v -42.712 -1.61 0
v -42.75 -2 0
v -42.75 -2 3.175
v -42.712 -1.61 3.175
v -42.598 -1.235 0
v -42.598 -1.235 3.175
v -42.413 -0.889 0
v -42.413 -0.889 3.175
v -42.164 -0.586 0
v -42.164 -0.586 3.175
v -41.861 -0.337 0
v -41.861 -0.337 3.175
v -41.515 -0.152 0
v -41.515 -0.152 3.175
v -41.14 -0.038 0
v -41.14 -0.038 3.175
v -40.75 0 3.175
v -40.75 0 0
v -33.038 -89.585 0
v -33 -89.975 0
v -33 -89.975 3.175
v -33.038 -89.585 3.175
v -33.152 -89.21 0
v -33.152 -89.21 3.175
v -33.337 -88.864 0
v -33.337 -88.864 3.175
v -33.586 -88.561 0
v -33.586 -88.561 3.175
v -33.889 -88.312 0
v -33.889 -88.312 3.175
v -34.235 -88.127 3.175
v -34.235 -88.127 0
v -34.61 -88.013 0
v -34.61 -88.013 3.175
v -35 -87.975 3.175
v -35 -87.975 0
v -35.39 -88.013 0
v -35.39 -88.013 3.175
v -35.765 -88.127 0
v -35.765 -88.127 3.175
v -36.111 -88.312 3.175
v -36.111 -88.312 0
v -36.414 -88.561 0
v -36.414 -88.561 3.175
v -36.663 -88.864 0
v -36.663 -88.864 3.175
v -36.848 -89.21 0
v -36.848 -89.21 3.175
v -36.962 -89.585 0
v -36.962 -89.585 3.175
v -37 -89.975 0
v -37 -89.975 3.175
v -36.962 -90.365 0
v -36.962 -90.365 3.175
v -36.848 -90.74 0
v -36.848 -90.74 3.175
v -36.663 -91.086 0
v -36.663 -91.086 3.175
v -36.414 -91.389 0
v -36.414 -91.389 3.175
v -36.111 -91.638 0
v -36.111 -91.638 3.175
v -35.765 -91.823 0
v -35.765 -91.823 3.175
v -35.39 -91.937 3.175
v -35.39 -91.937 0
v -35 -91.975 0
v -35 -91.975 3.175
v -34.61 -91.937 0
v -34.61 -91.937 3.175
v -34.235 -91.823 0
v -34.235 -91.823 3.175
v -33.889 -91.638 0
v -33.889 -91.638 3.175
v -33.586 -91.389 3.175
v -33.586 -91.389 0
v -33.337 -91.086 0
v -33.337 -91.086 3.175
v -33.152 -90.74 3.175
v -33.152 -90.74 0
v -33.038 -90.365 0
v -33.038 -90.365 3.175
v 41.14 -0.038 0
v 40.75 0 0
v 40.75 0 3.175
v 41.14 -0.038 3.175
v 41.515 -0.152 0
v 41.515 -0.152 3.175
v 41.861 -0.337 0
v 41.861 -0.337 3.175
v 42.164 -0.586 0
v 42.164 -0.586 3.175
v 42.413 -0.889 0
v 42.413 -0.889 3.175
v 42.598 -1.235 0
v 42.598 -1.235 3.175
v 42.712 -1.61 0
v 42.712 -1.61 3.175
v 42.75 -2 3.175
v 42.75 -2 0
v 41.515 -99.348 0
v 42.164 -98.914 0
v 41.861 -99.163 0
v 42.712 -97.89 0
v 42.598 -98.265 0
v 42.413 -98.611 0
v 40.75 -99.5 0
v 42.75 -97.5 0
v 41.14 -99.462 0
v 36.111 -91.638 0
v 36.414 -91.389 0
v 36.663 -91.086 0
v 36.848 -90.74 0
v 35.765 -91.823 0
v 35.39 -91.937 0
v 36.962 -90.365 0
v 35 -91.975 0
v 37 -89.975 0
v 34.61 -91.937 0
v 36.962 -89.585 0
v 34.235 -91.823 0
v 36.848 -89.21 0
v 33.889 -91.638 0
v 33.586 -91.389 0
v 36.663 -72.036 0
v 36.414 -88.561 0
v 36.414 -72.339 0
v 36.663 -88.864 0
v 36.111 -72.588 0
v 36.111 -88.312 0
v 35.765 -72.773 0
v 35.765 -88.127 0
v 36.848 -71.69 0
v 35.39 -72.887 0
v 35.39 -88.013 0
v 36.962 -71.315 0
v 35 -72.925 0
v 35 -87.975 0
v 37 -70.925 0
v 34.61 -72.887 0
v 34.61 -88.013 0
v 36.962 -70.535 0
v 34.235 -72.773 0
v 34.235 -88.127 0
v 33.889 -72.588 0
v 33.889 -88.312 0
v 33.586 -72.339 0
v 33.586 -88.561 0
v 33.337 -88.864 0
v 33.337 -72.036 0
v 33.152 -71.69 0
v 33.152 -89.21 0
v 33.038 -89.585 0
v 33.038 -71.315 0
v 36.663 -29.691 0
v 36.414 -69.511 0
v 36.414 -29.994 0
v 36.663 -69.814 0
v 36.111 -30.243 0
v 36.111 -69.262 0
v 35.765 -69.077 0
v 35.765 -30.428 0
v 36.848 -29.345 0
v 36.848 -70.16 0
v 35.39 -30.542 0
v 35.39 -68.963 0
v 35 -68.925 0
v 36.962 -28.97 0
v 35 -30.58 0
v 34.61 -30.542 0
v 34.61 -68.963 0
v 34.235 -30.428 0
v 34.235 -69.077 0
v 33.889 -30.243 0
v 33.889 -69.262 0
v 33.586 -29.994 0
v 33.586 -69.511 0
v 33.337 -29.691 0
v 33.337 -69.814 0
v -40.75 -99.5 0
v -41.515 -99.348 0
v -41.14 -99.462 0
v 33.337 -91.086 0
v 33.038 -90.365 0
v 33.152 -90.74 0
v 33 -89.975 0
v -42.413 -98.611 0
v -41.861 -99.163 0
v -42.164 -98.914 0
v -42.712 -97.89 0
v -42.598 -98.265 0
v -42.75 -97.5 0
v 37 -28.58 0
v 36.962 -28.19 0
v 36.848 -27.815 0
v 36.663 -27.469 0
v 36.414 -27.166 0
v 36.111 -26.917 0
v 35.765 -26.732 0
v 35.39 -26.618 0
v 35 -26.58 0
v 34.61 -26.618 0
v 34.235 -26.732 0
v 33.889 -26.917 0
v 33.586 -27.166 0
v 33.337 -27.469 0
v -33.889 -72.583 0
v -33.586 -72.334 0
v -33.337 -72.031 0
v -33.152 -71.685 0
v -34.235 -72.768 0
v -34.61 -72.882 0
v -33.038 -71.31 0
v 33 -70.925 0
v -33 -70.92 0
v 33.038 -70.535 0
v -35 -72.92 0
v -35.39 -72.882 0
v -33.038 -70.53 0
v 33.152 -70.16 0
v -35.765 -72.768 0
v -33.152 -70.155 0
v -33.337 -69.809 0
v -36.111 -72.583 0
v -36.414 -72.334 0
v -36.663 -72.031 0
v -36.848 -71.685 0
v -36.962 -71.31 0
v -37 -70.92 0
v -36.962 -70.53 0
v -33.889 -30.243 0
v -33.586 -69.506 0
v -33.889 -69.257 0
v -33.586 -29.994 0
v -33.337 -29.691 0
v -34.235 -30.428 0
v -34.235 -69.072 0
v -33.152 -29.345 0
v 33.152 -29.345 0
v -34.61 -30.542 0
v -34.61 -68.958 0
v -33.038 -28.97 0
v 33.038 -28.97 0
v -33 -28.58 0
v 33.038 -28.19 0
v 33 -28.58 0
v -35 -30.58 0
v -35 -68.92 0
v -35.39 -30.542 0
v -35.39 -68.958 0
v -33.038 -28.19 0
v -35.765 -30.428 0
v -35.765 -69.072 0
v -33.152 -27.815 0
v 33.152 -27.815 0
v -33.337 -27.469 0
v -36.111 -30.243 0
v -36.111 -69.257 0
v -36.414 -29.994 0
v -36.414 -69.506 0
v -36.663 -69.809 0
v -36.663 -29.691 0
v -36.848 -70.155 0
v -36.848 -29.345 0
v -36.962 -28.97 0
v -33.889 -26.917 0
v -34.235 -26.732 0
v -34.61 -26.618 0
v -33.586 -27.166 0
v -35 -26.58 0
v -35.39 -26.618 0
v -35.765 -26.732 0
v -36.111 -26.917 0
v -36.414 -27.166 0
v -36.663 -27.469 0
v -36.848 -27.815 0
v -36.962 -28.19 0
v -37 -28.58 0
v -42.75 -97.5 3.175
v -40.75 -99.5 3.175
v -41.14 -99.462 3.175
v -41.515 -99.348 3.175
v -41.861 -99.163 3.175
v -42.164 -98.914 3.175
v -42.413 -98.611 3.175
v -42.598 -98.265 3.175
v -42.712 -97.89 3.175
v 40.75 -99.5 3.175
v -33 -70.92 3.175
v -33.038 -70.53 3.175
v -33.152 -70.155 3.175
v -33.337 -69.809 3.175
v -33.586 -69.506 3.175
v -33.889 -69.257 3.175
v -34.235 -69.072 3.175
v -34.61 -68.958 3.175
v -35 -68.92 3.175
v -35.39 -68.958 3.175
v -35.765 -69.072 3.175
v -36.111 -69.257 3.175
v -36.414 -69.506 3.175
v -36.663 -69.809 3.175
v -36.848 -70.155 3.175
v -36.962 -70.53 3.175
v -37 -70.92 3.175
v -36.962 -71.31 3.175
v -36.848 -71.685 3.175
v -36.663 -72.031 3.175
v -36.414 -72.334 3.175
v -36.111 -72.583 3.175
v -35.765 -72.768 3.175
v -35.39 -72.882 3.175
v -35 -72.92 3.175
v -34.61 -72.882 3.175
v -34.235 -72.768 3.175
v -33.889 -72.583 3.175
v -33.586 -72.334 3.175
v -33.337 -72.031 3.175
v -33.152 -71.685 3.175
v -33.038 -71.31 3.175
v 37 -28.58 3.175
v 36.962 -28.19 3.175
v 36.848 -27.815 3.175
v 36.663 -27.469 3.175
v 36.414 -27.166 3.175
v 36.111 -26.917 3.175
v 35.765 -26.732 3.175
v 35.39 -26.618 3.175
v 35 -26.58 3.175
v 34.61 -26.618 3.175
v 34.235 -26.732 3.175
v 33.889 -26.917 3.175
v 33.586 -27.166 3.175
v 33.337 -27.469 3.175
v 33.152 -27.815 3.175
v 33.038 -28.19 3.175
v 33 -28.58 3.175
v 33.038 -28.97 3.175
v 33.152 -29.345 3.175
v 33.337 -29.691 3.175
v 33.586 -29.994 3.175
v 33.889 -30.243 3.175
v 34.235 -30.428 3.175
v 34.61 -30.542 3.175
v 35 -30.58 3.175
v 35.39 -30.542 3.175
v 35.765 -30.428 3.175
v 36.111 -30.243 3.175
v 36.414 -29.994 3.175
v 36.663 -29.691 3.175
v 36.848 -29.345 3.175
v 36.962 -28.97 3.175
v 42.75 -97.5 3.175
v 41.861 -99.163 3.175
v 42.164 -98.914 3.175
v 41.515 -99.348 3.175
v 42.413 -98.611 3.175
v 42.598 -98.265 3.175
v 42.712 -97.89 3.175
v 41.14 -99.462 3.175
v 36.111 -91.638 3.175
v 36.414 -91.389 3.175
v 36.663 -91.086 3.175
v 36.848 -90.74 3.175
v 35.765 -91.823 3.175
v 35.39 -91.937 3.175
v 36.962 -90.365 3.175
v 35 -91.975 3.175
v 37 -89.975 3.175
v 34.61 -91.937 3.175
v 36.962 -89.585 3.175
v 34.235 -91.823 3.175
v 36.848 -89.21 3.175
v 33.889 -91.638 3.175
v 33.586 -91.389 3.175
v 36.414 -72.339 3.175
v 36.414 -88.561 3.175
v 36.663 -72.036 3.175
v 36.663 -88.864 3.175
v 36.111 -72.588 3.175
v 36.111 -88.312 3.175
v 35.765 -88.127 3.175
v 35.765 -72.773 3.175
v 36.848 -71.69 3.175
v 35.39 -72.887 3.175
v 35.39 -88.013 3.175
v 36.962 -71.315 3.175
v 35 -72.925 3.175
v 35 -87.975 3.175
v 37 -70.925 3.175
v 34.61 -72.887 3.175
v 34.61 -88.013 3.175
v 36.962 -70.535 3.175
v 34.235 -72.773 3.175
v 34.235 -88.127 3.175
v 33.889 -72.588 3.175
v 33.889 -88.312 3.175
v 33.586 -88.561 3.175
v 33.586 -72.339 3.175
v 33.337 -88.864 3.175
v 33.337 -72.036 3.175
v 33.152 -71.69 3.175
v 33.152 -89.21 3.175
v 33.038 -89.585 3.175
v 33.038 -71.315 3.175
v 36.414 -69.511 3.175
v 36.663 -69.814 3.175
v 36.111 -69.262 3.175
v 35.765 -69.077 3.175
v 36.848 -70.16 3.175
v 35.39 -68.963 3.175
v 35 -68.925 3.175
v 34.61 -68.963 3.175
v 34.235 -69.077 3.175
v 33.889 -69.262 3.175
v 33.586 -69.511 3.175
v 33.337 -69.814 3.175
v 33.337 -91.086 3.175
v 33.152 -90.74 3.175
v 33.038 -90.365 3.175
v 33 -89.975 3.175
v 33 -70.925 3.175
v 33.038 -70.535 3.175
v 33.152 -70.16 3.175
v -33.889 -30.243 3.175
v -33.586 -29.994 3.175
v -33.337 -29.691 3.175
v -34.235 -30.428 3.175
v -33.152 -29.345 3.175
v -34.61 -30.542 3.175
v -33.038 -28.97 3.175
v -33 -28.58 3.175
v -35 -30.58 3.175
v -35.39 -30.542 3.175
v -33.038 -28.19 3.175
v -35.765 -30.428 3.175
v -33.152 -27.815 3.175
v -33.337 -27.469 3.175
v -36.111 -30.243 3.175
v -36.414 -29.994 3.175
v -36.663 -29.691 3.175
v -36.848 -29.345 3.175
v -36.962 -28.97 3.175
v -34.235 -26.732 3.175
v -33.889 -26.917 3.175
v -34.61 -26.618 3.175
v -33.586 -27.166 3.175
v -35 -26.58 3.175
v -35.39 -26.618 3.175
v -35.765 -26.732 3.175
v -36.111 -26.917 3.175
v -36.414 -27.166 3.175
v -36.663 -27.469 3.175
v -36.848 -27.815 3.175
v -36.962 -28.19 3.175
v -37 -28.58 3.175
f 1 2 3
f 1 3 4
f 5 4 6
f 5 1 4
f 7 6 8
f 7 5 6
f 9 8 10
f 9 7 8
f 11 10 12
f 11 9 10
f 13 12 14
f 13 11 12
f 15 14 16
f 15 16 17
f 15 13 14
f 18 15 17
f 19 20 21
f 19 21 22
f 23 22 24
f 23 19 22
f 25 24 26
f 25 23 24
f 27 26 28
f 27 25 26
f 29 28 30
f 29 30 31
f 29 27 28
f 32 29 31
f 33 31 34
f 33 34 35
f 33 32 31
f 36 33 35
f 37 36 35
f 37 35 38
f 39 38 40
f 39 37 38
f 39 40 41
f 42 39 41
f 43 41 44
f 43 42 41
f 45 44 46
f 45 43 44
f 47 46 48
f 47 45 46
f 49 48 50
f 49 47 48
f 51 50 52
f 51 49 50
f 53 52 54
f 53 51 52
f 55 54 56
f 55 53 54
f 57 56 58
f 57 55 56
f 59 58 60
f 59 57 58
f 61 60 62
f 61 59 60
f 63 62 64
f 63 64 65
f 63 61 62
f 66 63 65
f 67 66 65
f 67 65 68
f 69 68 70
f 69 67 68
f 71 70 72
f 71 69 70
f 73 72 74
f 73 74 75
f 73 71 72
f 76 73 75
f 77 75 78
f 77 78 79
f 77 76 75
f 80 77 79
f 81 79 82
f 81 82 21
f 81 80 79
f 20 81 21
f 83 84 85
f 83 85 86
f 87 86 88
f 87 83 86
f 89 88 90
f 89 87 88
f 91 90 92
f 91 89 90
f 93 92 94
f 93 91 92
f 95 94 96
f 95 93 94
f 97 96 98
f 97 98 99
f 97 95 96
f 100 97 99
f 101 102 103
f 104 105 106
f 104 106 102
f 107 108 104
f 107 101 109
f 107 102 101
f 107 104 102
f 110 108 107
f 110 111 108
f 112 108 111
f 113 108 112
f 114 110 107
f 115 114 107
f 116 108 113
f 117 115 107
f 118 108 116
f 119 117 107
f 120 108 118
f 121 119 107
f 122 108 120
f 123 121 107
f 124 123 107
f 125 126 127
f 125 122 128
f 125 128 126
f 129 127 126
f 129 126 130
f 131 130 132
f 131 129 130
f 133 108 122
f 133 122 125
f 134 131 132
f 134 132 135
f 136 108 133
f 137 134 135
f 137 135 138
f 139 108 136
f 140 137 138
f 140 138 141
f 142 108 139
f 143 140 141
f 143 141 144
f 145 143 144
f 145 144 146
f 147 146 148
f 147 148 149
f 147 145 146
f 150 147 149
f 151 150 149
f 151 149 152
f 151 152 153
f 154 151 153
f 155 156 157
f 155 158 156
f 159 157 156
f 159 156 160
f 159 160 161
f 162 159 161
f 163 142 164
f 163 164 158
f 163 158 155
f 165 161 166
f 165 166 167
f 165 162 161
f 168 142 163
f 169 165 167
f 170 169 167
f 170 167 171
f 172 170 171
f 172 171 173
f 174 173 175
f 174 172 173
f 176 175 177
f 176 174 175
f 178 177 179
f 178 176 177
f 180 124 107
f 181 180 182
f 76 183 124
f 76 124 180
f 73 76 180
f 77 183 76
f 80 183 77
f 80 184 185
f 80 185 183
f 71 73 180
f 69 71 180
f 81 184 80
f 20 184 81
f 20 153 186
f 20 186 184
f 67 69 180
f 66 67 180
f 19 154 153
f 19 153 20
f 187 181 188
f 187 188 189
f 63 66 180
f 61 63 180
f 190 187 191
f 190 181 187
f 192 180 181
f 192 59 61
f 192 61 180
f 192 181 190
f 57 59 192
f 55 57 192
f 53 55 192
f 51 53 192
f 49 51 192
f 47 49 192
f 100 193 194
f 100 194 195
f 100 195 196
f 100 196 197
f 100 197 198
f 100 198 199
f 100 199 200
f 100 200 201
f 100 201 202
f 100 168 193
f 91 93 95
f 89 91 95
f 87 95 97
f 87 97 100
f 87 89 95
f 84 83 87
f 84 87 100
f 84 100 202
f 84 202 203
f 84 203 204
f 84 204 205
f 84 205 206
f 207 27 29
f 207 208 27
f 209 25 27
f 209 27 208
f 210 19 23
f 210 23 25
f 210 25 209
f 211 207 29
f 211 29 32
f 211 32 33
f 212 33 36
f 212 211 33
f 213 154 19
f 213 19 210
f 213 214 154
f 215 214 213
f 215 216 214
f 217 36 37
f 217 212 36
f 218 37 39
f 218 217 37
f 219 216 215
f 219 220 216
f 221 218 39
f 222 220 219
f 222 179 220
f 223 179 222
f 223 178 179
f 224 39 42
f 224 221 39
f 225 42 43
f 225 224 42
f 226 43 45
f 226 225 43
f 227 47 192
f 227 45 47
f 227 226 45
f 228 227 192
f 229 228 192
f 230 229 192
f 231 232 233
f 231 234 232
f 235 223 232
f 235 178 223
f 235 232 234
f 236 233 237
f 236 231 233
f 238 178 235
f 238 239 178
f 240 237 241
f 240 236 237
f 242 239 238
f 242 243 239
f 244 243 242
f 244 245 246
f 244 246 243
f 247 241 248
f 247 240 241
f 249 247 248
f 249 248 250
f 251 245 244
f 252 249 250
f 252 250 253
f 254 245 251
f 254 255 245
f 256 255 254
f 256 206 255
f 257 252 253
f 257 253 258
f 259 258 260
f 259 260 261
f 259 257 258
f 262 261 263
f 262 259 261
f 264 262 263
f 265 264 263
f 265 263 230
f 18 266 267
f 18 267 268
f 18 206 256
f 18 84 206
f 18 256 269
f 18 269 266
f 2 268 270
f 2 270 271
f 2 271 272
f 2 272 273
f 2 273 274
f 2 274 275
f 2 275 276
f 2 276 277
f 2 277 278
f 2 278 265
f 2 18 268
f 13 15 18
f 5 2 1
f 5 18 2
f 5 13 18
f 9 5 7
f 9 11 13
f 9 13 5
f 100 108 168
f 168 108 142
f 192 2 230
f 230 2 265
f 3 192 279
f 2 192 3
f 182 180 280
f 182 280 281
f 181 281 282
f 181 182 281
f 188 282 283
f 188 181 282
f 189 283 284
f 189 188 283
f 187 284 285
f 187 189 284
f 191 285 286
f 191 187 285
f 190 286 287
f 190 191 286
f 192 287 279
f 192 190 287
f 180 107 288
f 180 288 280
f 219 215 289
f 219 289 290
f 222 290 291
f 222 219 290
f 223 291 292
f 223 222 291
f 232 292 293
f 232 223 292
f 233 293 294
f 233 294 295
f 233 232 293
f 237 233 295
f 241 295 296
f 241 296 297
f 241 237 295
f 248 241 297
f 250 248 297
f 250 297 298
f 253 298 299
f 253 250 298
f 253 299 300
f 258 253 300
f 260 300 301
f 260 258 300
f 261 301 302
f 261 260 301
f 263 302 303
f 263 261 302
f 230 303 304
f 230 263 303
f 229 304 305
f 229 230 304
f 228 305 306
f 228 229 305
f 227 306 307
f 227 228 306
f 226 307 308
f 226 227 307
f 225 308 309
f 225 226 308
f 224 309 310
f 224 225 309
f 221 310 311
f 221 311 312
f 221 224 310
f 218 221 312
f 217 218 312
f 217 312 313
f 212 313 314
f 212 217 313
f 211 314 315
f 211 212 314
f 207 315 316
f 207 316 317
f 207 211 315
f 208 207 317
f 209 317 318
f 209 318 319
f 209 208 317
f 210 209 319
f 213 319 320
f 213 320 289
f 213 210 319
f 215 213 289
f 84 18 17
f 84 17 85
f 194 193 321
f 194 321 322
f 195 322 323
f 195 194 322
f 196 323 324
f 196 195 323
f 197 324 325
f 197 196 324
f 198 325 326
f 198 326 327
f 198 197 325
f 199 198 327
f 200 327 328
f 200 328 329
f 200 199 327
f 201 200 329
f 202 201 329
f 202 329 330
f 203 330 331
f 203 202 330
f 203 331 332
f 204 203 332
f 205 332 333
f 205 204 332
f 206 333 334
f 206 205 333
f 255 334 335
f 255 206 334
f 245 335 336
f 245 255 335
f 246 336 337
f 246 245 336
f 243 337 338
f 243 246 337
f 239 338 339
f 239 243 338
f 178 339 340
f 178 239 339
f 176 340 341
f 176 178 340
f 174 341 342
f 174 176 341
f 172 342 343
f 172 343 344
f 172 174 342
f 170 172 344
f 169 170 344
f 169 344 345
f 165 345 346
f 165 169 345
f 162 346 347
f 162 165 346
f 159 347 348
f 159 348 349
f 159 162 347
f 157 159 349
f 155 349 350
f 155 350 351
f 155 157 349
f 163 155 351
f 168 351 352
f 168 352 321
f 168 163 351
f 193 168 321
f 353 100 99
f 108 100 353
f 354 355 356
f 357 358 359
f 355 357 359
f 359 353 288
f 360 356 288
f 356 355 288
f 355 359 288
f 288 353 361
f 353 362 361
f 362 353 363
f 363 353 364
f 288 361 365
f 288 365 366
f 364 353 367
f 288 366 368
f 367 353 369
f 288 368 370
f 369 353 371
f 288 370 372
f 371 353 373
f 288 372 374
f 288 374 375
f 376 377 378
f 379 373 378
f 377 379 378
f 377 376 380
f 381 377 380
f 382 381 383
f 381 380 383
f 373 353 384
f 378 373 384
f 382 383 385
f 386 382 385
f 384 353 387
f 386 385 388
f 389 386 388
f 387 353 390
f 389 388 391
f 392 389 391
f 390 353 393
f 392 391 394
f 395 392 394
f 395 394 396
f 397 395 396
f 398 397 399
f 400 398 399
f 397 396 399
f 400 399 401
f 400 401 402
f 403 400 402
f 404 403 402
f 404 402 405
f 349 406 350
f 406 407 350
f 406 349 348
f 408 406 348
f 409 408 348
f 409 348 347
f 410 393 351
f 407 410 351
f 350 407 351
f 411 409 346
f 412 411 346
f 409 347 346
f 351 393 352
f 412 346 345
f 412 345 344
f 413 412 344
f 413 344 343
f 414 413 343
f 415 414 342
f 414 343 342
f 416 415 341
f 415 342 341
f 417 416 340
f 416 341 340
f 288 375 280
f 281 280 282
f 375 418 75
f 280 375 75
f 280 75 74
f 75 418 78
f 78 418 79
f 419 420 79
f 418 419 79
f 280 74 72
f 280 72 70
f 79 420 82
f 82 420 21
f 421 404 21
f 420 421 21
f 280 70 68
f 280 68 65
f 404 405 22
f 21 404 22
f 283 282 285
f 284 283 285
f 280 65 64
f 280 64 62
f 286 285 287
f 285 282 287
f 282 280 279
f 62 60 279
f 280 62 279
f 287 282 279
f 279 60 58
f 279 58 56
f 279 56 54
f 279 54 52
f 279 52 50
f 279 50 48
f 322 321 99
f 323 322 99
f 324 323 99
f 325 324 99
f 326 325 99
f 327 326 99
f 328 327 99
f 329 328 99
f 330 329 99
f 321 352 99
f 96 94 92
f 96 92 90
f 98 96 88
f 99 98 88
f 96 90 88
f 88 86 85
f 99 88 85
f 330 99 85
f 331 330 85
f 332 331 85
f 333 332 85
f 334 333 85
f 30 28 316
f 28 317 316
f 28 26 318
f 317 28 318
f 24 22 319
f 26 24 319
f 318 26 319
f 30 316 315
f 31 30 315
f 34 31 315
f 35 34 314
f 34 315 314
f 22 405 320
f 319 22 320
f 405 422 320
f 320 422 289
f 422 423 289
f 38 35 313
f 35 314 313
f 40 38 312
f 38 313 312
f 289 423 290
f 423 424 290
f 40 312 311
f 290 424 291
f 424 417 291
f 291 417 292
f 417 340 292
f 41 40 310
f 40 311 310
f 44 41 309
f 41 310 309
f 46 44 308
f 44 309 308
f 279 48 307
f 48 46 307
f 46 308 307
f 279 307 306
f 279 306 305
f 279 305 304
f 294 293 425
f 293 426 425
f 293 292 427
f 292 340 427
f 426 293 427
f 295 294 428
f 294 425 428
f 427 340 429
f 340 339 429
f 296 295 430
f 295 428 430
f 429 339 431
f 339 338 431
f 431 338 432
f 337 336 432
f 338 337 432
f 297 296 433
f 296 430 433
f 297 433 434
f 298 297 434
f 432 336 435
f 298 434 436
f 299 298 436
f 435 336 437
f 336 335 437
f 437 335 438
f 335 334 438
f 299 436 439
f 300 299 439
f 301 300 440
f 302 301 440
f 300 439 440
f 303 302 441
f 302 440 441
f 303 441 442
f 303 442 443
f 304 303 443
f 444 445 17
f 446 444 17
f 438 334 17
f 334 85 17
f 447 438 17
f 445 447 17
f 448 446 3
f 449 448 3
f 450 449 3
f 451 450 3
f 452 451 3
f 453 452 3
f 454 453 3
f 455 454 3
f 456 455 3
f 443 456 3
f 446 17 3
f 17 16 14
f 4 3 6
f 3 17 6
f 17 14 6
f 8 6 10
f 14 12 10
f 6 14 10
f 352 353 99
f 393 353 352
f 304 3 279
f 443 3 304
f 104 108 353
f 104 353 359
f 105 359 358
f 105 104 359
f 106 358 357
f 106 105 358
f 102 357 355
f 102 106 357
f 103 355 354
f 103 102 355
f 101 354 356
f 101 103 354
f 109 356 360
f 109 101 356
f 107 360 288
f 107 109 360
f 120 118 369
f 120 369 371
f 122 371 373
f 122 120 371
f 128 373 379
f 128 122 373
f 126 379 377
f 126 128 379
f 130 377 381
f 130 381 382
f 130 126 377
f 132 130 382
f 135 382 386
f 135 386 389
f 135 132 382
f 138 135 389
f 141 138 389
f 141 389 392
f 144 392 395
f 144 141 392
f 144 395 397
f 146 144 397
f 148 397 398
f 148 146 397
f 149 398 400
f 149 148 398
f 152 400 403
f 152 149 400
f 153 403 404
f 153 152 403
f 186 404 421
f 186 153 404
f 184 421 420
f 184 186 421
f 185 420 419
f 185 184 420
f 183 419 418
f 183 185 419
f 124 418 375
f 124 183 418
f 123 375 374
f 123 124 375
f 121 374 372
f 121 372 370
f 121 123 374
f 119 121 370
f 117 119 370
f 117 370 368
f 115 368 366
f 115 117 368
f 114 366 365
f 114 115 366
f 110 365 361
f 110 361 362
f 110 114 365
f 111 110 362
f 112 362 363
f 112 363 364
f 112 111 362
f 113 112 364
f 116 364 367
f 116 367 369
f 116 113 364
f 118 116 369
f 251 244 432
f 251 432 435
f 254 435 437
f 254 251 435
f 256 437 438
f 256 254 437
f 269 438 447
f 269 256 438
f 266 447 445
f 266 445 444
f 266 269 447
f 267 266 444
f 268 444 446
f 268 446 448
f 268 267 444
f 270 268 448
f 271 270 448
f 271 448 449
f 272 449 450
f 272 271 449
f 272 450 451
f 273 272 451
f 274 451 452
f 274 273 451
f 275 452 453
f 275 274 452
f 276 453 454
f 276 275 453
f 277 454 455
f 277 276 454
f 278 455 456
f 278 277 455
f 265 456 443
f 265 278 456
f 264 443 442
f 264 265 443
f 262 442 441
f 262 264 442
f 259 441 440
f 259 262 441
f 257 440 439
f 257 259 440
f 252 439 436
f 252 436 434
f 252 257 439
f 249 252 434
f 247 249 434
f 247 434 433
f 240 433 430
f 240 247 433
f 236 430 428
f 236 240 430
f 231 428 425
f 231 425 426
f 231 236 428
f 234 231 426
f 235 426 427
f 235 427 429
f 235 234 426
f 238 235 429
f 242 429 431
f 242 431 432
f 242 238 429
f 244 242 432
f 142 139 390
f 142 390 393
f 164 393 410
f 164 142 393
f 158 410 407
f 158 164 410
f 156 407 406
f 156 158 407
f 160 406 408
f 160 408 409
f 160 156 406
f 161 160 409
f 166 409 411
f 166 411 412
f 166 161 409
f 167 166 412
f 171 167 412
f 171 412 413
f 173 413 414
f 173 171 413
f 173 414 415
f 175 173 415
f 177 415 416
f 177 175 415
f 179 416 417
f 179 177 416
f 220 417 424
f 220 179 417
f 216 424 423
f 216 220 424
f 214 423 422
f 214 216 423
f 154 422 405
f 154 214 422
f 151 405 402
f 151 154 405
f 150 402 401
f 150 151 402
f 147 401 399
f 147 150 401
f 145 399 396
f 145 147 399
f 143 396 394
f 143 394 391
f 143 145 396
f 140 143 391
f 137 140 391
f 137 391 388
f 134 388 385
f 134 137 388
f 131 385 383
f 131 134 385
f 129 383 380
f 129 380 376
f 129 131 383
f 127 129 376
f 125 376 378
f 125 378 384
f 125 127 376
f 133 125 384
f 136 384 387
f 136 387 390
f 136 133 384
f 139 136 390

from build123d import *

# Parameters (mm, degrees)
SKETCH1_R           = 2
BOSS_EXTRUDE1_DEPTH = 3.175


with BuildPart() as part:
    # Sketch1 → Boss-Extrude1 (new body)
    with BuildSketch(Plane.XY):
        with BuildLine():
            Line((-40.75, 0), (40.75, 0))
            ThreePointArc((40.75, 0), (42.164213562, -0.585786438), (42.75, -2))
            Line((42.75, -2), (42.75, -97.5))
            ThreePointArc((42.75, -97.5), (42.164213562, -98.914213562), (40.75, -99.5))
            Line((40.75, -99.5), (-40.75, -99.5))
            ThreePointArc((-40.75, -99.5), (-42.164213562, -98.914213562), (-42.75, -97.5))
            Line((-42.75, -97.5), (-42.75, -2))
            ThreePointArc((-42.75, -2), (-42.164213562, -0.585786438), (-40.75, 0))
        make_face()
        with Locations((35, -89.975)):
            Circle(SKETCH1_R, mode=Mode.SUBTRACT)
        with Locations((-35, -89.975)):
            Circle(SKETCH1_R, mode=Mode.SUBTRACT)
        with Locations((35, -70.925)):
            Circle(SKETCH1_R, mode=Mode.SUBTRACT)
        with Locations((35, -28.58)):
            Circle(SKETCH1_R, mode=Mode.SUBTRACT)
        with Locations((-35, -70.92)):
            Circle(SKETCH1_R, mode=Mode.SUBTRACT)
        with Locations((-35, -28.58)):
            Circle(SKETCH1_R, mode=Mode.SUBTRACT)
    extrude(amount=BOSS_EXTRUDE1_DEPTH)


solid = part.part
